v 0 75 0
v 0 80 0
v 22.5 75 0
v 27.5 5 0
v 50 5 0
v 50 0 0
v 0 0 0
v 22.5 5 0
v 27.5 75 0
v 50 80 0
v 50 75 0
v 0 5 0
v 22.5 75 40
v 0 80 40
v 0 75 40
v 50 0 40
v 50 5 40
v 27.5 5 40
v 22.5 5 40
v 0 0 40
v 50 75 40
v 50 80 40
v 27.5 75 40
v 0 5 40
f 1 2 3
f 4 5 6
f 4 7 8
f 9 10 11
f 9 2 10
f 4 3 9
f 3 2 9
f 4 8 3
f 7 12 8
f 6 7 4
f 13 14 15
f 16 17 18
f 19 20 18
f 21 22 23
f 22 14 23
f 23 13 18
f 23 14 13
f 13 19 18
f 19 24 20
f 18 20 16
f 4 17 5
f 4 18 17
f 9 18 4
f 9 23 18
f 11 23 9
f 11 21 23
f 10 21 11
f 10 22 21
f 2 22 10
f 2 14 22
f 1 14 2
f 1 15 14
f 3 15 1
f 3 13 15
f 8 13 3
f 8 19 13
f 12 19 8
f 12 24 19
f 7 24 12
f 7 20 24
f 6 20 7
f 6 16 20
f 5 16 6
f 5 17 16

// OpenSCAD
$fn = 32;

// ----------------------------------------------------------------------
// Structural section: ibeam 50 x 80 mm
// ----------------------------------------------------------------------

// --- parameters (mm) ---
sec_w = 50;               // section width, X
sec_h = 80;               // section height, Y
flange_t = 5;             // flange thickness
web_t = 5;                // web thickness
plate_t = 40;             // cut length, Z (extrusion height)

profile = [[0, 0], [50, 0], [50, 5], [27.5, 5], [27.5, 75], [50, 75], [50, 80], [0, 80], [0, 75], [22.5, 75], [22.5, 5], [0, 5]];  // primary outline, 12 points, counter clockwise

// --- the one profile operation ---
linear_extrude(height = plate_t) polygon(points = profile);
